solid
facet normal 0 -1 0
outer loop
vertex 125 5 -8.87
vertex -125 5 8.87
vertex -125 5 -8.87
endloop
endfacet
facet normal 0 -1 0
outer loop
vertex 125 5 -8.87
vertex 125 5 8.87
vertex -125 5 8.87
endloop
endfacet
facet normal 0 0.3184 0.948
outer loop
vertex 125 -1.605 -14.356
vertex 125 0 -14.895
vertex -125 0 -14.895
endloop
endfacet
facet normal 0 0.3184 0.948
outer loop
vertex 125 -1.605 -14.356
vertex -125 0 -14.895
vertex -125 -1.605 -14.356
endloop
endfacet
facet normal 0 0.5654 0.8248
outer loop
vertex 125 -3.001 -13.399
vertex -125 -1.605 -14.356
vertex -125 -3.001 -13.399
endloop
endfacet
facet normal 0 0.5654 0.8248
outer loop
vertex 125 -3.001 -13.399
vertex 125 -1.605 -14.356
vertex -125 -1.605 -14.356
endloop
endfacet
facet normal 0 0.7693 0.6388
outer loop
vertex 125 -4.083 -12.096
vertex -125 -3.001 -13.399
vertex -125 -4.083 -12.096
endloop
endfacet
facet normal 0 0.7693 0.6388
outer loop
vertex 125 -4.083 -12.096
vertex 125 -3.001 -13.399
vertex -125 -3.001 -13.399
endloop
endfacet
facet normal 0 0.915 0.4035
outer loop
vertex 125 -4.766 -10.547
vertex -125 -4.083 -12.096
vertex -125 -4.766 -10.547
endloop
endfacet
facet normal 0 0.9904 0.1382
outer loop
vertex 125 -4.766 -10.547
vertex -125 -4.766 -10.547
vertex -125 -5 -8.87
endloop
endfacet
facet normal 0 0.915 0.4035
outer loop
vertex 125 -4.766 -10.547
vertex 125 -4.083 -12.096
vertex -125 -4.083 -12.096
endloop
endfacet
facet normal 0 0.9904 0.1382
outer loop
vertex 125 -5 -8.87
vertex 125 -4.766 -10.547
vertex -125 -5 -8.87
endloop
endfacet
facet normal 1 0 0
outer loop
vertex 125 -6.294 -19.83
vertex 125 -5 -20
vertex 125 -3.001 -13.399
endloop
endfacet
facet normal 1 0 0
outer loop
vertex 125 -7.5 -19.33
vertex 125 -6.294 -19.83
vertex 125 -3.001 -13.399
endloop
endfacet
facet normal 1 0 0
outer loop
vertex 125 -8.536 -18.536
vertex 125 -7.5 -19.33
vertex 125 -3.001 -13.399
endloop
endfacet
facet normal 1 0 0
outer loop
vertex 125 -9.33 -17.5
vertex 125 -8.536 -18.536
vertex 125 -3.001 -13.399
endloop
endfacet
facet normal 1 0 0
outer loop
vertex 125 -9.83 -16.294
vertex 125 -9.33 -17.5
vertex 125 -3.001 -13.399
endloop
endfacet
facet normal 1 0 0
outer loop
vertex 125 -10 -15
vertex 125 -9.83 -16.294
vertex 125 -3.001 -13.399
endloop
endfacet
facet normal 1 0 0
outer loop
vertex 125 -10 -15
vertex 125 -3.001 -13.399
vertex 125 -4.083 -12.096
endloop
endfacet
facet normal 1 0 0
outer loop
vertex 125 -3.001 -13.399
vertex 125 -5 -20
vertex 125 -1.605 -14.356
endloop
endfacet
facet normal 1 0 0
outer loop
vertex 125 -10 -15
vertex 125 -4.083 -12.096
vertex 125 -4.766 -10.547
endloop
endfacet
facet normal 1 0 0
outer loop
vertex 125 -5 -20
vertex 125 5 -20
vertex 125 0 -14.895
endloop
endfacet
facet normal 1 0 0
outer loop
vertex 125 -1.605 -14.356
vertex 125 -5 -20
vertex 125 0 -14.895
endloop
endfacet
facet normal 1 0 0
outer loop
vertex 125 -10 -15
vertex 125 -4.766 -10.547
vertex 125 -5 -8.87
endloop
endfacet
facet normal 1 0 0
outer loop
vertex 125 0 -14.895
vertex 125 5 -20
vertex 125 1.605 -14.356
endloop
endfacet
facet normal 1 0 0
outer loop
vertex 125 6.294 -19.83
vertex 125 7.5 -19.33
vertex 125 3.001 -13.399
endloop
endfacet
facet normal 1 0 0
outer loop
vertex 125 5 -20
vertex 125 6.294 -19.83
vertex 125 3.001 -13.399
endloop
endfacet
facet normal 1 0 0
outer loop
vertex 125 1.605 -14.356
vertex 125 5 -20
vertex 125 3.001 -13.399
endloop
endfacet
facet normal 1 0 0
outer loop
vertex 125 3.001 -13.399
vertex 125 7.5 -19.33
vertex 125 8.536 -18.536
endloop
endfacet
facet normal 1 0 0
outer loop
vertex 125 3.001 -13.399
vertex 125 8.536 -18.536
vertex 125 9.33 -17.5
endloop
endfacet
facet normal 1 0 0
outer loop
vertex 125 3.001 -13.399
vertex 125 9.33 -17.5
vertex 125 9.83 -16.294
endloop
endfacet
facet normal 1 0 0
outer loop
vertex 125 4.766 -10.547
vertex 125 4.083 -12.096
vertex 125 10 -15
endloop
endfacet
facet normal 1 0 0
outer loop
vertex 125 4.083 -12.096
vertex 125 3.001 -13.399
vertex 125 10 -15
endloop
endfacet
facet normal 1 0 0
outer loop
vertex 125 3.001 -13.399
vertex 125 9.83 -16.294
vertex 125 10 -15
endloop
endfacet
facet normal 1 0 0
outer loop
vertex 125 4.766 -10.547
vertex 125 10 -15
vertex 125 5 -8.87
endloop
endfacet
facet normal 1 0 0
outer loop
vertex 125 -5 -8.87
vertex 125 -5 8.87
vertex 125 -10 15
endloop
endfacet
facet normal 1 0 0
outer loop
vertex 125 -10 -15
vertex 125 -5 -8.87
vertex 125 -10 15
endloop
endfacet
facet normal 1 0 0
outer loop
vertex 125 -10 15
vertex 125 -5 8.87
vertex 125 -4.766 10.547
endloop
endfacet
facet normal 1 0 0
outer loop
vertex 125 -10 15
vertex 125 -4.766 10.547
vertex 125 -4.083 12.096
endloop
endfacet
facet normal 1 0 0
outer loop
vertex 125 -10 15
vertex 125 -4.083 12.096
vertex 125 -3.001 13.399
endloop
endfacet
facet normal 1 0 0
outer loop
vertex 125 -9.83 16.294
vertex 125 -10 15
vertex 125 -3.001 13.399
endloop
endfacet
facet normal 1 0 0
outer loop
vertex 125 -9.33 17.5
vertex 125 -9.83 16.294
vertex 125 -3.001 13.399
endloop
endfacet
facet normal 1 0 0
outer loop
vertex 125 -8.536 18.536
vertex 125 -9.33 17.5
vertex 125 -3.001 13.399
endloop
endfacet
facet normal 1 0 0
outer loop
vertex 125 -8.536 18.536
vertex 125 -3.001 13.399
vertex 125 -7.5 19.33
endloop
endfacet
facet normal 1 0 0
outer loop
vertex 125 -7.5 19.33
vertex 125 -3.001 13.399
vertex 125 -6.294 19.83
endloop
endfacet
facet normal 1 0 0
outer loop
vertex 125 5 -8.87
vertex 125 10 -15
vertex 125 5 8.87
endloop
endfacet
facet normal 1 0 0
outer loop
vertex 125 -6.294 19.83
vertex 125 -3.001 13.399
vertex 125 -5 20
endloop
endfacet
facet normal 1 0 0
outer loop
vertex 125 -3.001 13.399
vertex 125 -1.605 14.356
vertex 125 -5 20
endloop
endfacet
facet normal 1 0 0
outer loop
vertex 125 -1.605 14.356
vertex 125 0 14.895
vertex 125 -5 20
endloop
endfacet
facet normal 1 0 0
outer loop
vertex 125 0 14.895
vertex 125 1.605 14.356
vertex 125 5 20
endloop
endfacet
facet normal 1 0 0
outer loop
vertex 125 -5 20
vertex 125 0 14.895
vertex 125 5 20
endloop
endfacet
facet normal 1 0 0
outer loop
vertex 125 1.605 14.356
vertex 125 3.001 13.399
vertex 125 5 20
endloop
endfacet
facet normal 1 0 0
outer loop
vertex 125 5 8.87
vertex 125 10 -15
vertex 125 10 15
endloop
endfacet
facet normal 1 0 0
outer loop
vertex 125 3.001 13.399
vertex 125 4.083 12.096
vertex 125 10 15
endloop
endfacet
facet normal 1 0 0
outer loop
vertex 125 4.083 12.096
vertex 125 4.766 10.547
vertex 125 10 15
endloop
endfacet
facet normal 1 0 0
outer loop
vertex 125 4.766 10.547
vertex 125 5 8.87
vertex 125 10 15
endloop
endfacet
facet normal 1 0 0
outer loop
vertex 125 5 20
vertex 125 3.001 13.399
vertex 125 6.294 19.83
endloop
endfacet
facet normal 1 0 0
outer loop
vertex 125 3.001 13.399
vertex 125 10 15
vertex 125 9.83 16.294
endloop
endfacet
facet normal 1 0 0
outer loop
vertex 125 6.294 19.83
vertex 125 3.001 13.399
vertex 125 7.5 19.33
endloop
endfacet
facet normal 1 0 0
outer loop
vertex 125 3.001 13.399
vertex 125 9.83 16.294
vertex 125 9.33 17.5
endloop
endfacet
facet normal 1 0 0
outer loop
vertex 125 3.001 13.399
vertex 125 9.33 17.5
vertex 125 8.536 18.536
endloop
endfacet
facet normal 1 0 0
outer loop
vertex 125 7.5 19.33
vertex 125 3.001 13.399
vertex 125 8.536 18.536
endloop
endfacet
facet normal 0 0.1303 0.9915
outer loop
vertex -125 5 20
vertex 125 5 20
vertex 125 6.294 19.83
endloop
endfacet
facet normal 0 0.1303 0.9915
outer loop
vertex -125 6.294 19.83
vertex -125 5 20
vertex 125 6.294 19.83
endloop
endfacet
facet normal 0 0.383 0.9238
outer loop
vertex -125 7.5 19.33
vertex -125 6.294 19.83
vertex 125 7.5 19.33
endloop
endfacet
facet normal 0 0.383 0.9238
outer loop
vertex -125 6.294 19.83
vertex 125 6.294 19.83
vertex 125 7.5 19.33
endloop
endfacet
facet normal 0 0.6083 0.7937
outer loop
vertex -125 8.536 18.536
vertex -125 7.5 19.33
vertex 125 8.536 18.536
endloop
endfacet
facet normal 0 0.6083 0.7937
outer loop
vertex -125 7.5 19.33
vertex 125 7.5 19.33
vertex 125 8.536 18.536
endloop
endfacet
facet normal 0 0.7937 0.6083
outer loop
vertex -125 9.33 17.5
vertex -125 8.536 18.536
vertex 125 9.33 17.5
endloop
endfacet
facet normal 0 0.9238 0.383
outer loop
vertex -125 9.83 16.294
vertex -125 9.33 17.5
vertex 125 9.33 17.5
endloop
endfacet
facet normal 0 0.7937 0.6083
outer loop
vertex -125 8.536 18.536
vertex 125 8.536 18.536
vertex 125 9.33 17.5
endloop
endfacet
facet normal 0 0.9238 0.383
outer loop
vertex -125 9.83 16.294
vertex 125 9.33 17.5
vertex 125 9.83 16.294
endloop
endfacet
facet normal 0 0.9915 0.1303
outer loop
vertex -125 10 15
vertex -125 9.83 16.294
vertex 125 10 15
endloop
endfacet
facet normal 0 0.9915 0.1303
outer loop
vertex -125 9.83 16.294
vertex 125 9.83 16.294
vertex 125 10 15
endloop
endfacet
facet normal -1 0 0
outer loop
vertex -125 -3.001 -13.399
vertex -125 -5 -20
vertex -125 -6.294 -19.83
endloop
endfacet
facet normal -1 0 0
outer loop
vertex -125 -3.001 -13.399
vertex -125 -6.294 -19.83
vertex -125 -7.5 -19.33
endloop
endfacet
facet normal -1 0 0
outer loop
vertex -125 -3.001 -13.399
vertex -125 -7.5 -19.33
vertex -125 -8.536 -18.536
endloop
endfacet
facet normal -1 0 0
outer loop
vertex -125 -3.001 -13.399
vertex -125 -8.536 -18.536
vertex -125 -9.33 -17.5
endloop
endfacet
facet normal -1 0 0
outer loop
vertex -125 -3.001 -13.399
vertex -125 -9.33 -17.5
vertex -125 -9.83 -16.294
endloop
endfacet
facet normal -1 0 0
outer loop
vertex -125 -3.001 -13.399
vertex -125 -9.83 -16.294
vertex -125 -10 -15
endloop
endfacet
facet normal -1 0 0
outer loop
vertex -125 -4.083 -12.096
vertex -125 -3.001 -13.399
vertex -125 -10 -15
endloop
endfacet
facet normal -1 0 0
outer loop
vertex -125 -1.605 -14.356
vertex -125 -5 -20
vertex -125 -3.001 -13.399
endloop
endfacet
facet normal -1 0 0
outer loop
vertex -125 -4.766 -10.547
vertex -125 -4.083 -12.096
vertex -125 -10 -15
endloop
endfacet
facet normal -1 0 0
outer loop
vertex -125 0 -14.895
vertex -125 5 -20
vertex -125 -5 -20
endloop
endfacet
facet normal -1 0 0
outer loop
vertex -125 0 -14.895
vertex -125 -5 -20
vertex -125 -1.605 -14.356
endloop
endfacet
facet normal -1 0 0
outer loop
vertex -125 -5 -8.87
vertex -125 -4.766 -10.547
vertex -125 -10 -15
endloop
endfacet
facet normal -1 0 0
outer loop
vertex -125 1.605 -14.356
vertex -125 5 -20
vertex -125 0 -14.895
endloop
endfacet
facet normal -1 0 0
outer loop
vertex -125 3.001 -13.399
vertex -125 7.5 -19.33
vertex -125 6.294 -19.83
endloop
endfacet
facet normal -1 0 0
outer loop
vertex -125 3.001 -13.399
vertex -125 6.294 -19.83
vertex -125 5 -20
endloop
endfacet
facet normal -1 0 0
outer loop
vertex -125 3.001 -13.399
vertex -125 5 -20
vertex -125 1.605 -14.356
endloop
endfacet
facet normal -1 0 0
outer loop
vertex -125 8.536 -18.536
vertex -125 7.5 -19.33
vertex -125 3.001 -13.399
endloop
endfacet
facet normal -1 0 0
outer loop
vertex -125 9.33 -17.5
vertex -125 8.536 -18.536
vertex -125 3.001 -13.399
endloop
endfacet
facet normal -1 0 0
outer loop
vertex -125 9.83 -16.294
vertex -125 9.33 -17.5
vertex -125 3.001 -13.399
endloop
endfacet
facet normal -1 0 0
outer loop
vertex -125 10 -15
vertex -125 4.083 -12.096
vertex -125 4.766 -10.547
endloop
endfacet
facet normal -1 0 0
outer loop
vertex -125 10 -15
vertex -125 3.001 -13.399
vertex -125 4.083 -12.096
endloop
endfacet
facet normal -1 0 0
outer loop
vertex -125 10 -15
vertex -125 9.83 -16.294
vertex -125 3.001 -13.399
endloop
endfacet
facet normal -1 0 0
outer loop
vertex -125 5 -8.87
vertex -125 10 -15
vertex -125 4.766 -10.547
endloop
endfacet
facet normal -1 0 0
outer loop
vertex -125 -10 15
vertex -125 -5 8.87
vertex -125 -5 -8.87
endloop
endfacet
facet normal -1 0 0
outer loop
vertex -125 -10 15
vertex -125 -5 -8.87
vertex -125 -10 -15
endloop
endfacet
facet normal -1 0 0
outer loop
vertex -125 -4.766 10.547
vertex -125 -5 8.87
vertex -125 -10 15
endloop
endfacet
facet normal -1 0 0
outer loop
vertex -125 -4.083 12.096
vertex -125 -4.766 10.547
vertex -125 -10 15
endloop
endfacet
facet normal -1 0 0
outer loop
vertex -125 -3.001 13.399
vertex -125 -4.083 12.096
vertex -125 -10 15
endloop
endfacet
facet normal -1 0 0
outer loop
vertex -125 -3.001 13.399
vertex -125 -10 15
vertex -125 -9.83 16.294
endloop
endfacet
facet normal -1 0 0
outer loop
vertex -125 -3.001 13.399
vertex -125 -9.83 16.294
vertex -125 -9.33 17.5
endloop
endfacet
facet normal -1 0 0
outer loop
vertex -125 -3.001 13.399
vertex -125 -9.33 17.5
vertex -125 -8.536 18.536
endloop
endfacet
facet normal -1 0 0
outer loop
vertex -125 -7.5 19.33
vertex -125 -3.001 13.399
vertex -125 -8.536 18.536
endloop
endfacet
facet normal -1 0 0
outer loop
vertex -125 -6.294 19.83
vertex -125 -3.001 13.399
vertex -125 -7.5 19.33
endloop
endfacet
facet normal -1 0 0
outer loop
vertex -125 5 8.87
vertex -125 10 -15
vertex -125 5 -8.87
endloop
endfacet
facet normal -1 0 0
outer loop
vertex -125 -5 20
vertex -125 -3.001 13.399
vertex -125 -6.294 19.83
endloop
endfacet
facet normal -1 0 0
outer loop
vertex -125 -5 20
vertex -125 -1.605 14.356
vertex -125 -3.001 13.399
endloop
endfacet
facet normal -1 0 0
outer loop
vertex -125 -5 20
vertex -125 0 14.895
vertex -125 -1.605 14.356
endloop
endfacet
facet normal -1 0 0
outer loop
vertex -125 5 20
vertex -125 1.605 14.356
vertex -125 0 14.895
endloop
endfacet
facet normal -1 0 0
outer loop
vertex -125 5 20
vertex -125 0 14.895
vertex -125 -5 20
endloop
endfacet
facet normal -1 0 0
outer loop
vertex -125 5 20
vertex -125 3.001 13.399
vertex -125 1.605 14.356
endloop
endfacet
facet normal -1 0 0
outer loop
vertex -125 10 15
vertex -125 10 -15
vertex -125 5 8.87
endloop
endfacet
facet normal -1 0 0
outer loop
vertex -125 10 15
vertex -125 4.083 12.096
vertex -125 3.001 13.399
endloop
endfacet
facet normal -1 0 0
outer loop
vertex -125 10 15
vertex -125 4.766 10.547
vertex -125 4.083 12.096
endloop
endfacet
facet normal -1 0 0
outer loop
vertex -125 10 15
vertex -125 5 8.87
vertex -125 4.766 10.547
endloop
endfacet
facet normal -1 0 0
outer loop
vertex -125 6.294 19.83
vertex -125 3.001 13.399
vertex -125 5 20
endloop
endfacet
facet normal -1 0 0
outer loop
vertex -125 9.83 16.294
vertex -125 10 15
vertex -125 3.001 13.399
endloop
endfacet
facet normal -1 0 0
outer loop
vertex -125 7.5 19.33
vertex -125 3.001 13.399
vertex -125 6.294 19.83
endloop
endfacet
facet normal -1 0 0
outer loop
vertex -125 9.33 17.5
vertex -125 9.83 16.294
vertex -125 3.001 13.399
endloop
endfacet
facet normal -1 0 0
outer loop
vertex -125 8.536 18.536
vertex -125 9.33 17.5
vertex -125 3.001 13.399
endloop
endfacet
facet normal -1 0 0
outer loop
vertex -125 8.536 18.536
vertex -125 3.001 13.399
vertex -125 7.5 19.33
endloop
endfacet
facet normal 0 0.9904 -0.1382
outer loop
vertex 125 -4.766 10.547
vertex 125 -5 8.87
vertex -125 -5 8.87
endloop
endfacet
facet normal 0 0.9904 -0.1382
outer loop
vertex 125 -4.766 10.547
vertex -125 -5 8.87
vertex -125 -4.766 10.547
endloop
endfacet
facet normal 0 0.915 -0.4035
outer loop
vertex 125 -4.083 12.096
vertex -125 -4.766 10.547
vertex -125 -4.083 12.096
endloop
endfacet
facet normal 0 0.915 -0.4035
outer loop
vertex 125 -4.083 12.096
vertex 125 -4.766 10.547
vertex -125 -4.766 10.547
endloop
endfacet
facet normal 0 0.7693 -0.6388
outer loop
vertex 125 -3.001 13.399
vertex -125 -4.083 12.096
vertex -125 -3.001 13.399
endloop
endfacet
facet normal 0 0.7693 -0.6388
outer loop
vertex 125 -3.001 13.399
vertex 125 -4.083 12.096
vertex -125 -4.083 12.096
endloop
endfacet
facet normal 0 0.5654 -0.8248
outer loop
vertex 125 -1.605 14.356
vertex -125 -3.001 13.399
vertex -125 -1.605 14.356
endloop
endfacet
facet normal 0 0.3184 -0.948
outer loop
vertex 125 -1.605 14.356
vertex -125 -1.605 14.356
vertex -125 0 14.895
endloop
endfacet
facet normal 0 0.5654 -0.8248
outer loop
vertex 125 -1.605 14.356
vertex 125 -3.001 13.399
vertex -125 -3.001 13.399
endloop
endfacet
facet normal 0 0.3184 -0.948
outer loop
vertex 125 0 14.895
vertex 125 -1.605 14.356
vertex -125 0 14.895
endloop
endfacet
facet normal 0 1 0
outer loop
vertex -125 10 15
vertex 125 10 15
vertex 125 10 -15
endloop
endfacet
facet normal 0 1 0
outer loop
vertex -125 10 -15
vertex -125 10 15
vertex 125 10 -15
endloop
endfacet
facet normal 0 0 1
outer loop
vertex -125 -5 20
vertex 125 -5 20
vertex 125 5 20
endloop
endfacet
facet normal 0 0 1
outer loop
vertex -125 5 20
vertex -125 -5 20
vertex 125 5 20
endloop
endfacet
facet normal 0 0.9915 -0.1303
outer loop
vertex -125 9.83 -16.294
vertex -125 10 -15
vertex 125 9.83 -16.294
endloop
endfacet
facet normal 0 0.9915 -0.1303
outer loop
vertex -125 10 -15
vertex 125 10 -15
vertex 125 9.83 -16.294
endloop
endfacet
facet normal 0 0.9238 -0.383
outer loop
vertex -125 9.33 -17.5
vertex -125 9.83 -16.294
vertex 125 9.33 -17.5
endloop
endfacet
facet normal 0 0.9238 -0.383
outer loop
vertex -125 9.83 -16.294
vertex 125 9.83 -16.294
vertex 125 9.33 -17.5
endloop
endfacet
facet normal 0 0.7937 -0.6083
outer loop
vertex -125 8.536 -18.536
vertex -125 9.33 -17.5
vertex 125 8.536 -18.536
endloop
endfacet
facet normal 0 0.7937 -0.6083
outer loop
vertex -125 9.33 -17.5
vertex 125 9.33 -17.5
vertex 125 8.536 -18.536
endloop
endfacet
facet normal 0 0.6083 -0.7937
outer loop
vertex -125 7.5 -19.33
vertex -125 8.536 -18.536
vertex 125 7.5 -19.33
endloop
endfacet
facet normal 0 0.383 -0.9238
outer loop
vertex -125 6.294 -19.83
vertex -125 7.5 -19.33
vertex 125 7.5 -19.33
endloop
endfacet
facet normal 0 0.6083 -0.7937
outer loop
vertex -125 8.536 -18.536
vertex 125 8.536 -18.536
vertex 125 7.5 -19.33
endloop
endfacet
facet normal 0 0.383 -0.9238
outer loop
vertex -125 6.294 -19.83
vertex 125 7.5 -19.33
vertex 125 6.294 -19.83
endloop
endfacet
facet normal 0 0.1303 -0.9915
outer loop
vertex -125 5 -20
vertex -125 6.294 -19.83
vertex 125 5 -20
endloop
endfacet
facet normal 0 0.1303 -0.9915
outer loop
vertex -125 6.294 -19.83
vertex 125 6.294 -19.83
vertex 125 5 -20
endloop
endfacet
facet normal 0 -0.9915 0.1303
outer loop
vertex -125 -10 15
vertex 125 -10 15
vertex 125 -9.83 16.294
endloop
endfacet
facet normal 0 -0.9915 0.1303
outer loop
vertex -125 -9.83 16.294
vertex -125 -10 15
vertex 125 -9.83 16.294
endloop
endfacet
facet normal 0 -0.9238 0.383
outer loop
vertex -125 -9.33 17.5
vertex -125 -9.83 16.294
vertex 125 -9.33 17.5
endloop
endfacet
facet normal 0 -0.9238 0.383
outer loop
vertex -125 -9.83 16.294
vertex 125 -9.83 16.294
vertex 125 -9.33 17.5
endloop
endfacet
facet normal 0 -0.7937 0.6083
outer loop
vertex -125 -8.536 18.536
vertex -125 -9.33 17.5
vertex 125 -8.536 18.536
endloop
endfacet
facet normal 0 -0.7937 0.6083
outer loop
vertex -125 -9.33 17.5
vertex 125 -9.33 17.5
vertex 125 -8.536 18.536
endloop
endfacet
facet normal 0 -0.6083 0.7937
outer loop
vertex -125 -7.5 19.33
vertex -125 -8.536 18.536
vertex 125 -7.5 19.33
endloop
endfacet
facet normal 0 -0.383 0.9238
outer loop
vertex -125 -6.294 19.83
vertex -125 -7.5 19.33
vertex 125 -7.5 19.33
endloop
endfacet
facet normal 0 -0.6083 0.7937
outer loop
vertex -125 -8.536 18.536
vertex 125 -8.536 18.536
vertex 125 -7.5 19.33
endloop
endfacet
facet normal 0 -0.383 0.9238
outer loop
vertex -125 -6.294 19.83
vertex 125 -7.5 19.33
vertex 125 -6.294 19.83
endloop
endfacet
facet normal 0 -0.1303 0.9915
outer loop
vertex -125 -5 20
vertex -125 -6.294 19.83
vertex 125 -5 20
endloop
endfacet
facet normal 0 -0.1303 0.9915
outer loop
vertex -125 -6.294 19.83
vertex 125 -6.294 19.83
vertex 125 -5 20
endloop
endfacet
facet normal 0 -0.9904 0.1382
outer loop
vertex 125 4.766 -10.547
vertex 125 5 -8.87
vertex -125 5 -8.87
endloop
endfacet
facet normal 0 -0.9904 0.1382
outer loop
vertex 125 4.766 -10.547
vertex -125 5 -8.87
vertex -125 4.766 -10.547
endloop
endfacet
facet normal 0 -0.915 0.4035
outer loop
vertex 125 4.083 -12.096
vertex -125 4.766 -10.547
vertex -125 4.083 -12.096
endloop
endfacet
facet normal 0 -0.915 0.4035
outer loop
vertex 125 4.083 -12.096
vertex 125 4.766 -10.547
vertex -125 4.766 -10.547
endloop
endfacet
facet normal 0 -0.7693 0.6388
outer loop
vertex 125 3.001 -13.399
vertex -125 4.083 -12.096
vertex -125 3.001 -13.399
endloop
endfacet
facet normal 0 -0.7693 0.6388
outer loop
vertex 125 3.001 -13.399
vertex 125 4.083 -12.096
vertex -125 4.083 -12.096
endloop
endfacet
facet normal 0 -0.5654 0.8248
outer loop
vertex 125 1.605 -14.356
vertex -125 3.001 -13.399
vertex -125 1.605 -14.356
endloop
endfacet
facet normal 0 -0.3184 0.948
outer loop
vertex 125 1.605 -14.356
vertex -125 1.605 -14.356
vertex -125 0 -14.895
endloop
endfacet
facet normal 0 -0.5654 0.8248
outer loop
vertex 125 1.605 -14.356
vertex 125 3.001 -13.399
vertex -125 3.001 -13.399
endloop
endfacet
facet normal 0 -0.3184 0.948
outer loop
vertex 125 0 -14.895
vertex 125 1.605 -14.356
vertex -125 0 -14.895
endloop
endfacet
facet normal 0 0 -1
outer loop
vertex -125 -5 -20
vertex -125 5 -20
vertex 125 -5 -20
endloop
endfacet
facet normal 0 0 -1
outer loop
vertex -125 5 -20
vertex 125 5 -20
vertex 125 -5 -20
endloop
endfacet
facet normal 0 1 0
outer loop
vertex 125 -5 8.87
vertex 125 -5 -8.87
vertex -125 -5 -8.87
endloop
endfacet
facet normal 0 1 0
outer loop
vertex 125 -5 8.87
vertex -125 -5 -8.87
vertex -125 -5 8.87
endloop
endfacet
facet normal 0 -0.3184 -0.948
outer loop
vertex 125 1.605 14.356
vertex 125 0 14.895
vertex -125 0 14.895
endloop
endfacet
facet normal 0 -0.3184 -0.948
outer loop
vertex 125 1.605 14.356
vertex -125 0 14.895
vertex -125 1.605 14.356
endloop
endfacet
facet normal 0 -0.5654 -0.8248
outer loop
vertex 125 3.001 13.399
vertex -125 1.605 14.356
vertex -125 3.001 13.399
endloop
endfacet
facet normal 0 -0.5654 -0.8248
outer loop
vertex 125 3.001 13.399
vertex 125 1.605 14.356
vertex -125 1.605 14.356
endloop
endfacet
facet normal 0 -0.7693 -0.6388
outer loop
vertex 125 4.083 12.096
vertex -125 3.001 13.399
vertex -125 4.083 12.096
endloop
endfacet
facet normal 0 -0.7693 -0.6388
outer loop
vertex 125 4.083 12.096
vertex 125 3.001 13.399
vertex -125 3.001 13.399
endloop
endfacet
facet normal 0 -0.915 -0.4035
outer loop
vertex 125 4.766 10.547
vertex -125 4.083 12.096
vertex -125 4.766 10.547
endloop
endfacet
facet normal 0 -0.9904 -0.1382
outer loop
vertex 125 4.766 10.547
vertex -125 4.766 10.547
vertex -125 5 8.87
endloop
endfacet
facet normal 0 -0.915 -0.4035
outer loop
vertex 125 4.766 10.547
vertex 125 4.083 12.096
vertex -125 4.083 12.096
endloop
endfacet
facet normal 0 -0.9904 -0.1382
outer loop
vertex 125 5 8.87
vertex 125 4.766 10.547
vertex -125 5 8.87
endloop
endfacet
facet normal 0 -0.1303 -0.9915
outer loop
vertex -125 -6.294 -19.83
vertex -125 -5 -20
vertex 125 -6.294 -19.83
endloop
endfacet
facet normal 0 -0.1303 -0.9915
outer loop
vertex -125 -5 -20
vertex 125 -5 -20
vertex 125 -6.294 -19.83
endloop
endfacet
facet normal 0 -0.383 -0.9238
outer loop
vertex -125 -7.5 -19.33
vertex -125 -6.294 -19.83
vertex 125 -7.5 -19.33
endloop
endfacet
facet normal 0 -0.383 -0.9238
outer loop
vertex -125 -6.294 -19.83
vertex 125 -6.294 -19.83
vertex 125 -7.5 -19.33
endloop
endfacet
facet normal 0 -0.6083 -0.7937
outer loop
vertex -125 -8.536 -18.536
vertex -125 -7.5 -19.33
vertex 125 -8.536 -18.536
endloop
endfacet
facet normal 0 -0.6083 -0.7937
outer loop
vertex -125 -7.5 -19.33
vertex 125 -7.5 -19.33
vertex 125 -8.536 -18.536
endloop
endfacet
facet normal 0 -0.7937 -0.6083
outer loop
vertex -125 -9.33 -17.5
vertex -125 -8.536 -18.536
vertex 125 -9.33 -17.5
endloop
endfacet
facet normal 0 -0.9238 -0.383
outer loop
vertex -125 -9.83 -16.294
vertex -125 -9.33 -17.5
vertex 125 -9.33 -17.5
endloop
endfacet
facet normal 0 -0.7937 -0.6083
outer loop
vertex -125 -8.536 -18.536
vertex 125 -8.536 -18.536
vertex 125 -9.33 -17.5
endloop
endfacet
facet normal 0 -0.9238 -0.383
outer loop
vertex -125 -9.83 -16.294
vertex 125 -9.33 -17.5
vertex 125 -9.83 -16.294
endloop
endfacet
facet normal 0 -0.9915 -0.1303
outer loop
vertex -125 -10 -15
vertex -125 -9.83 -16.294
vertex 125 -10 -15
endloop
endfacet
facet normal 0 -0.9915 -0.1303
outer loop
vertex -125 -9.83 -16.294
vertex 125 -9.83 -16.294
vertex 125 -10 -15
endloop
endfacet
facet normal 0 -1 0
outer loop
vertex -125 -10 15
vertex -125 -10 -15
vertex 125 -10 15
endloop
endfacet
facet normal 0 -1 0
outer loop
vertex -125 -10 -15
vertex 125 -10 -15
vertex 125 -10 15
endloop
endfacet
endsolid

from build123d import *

# Parameters (mm, degrees)
BOSS_EXTRUDE1_DEPTH = 125


with BuildPart() as part:
    # Sketch1 → Boss-Extrude1 (new, symmetric)
    with BuildSketch(Plane(origin=(0, 0, 0), x_dir=(0, 0, -1), z_dir=(1, 0, 0))):
        with BuildLine():
            Line((-15, 10), (15, 10))
            ThreePointArc((15, 10), (18.535533906, 8.535533906), (20, 5))
            Line((20, 5), (20, -5))
            ThreePointArc((20, -5), (18.535533906, -8.535533906), (15, -10))
            Line((15, -10), (-15, -10))
            ThreePointArc((-15, -10), (-18.535533906, -8.535533906), (-20, -5))
            Line((-20, -5), (-20, 5))
            ThreePointArc((-20, 5), (-18.535533906, 8.535533906), (-15, 10))
        make_face()
        with BuildLine():
            Line((-8.870332019, 5), (8.870332019, 5))
            ThreePointArc((8.870332019, 5), (12.784941828, 3.587180501), (14.895004608, 0))
            ThreePointArc((14.895004608, 0), (12.784941828, -3.587180501), (8.870332019, -5))
            Line((8.870332019, -5), (-8.870332019, -5))
            ThreePointArc((-8.870332019, -5), (-12.784941828, -3.587180501), (-14.895004608, 0))
            ThreePointArc((-14.895004608, 0), (-12.784941828, 3.587180501), (-8.870332019, 5))
        make_face(mode=Mode.SUBTRACT)
    extrude(amount=BOSS_EXTRUDE1_DEPTH, both=True)


solid = part.part
